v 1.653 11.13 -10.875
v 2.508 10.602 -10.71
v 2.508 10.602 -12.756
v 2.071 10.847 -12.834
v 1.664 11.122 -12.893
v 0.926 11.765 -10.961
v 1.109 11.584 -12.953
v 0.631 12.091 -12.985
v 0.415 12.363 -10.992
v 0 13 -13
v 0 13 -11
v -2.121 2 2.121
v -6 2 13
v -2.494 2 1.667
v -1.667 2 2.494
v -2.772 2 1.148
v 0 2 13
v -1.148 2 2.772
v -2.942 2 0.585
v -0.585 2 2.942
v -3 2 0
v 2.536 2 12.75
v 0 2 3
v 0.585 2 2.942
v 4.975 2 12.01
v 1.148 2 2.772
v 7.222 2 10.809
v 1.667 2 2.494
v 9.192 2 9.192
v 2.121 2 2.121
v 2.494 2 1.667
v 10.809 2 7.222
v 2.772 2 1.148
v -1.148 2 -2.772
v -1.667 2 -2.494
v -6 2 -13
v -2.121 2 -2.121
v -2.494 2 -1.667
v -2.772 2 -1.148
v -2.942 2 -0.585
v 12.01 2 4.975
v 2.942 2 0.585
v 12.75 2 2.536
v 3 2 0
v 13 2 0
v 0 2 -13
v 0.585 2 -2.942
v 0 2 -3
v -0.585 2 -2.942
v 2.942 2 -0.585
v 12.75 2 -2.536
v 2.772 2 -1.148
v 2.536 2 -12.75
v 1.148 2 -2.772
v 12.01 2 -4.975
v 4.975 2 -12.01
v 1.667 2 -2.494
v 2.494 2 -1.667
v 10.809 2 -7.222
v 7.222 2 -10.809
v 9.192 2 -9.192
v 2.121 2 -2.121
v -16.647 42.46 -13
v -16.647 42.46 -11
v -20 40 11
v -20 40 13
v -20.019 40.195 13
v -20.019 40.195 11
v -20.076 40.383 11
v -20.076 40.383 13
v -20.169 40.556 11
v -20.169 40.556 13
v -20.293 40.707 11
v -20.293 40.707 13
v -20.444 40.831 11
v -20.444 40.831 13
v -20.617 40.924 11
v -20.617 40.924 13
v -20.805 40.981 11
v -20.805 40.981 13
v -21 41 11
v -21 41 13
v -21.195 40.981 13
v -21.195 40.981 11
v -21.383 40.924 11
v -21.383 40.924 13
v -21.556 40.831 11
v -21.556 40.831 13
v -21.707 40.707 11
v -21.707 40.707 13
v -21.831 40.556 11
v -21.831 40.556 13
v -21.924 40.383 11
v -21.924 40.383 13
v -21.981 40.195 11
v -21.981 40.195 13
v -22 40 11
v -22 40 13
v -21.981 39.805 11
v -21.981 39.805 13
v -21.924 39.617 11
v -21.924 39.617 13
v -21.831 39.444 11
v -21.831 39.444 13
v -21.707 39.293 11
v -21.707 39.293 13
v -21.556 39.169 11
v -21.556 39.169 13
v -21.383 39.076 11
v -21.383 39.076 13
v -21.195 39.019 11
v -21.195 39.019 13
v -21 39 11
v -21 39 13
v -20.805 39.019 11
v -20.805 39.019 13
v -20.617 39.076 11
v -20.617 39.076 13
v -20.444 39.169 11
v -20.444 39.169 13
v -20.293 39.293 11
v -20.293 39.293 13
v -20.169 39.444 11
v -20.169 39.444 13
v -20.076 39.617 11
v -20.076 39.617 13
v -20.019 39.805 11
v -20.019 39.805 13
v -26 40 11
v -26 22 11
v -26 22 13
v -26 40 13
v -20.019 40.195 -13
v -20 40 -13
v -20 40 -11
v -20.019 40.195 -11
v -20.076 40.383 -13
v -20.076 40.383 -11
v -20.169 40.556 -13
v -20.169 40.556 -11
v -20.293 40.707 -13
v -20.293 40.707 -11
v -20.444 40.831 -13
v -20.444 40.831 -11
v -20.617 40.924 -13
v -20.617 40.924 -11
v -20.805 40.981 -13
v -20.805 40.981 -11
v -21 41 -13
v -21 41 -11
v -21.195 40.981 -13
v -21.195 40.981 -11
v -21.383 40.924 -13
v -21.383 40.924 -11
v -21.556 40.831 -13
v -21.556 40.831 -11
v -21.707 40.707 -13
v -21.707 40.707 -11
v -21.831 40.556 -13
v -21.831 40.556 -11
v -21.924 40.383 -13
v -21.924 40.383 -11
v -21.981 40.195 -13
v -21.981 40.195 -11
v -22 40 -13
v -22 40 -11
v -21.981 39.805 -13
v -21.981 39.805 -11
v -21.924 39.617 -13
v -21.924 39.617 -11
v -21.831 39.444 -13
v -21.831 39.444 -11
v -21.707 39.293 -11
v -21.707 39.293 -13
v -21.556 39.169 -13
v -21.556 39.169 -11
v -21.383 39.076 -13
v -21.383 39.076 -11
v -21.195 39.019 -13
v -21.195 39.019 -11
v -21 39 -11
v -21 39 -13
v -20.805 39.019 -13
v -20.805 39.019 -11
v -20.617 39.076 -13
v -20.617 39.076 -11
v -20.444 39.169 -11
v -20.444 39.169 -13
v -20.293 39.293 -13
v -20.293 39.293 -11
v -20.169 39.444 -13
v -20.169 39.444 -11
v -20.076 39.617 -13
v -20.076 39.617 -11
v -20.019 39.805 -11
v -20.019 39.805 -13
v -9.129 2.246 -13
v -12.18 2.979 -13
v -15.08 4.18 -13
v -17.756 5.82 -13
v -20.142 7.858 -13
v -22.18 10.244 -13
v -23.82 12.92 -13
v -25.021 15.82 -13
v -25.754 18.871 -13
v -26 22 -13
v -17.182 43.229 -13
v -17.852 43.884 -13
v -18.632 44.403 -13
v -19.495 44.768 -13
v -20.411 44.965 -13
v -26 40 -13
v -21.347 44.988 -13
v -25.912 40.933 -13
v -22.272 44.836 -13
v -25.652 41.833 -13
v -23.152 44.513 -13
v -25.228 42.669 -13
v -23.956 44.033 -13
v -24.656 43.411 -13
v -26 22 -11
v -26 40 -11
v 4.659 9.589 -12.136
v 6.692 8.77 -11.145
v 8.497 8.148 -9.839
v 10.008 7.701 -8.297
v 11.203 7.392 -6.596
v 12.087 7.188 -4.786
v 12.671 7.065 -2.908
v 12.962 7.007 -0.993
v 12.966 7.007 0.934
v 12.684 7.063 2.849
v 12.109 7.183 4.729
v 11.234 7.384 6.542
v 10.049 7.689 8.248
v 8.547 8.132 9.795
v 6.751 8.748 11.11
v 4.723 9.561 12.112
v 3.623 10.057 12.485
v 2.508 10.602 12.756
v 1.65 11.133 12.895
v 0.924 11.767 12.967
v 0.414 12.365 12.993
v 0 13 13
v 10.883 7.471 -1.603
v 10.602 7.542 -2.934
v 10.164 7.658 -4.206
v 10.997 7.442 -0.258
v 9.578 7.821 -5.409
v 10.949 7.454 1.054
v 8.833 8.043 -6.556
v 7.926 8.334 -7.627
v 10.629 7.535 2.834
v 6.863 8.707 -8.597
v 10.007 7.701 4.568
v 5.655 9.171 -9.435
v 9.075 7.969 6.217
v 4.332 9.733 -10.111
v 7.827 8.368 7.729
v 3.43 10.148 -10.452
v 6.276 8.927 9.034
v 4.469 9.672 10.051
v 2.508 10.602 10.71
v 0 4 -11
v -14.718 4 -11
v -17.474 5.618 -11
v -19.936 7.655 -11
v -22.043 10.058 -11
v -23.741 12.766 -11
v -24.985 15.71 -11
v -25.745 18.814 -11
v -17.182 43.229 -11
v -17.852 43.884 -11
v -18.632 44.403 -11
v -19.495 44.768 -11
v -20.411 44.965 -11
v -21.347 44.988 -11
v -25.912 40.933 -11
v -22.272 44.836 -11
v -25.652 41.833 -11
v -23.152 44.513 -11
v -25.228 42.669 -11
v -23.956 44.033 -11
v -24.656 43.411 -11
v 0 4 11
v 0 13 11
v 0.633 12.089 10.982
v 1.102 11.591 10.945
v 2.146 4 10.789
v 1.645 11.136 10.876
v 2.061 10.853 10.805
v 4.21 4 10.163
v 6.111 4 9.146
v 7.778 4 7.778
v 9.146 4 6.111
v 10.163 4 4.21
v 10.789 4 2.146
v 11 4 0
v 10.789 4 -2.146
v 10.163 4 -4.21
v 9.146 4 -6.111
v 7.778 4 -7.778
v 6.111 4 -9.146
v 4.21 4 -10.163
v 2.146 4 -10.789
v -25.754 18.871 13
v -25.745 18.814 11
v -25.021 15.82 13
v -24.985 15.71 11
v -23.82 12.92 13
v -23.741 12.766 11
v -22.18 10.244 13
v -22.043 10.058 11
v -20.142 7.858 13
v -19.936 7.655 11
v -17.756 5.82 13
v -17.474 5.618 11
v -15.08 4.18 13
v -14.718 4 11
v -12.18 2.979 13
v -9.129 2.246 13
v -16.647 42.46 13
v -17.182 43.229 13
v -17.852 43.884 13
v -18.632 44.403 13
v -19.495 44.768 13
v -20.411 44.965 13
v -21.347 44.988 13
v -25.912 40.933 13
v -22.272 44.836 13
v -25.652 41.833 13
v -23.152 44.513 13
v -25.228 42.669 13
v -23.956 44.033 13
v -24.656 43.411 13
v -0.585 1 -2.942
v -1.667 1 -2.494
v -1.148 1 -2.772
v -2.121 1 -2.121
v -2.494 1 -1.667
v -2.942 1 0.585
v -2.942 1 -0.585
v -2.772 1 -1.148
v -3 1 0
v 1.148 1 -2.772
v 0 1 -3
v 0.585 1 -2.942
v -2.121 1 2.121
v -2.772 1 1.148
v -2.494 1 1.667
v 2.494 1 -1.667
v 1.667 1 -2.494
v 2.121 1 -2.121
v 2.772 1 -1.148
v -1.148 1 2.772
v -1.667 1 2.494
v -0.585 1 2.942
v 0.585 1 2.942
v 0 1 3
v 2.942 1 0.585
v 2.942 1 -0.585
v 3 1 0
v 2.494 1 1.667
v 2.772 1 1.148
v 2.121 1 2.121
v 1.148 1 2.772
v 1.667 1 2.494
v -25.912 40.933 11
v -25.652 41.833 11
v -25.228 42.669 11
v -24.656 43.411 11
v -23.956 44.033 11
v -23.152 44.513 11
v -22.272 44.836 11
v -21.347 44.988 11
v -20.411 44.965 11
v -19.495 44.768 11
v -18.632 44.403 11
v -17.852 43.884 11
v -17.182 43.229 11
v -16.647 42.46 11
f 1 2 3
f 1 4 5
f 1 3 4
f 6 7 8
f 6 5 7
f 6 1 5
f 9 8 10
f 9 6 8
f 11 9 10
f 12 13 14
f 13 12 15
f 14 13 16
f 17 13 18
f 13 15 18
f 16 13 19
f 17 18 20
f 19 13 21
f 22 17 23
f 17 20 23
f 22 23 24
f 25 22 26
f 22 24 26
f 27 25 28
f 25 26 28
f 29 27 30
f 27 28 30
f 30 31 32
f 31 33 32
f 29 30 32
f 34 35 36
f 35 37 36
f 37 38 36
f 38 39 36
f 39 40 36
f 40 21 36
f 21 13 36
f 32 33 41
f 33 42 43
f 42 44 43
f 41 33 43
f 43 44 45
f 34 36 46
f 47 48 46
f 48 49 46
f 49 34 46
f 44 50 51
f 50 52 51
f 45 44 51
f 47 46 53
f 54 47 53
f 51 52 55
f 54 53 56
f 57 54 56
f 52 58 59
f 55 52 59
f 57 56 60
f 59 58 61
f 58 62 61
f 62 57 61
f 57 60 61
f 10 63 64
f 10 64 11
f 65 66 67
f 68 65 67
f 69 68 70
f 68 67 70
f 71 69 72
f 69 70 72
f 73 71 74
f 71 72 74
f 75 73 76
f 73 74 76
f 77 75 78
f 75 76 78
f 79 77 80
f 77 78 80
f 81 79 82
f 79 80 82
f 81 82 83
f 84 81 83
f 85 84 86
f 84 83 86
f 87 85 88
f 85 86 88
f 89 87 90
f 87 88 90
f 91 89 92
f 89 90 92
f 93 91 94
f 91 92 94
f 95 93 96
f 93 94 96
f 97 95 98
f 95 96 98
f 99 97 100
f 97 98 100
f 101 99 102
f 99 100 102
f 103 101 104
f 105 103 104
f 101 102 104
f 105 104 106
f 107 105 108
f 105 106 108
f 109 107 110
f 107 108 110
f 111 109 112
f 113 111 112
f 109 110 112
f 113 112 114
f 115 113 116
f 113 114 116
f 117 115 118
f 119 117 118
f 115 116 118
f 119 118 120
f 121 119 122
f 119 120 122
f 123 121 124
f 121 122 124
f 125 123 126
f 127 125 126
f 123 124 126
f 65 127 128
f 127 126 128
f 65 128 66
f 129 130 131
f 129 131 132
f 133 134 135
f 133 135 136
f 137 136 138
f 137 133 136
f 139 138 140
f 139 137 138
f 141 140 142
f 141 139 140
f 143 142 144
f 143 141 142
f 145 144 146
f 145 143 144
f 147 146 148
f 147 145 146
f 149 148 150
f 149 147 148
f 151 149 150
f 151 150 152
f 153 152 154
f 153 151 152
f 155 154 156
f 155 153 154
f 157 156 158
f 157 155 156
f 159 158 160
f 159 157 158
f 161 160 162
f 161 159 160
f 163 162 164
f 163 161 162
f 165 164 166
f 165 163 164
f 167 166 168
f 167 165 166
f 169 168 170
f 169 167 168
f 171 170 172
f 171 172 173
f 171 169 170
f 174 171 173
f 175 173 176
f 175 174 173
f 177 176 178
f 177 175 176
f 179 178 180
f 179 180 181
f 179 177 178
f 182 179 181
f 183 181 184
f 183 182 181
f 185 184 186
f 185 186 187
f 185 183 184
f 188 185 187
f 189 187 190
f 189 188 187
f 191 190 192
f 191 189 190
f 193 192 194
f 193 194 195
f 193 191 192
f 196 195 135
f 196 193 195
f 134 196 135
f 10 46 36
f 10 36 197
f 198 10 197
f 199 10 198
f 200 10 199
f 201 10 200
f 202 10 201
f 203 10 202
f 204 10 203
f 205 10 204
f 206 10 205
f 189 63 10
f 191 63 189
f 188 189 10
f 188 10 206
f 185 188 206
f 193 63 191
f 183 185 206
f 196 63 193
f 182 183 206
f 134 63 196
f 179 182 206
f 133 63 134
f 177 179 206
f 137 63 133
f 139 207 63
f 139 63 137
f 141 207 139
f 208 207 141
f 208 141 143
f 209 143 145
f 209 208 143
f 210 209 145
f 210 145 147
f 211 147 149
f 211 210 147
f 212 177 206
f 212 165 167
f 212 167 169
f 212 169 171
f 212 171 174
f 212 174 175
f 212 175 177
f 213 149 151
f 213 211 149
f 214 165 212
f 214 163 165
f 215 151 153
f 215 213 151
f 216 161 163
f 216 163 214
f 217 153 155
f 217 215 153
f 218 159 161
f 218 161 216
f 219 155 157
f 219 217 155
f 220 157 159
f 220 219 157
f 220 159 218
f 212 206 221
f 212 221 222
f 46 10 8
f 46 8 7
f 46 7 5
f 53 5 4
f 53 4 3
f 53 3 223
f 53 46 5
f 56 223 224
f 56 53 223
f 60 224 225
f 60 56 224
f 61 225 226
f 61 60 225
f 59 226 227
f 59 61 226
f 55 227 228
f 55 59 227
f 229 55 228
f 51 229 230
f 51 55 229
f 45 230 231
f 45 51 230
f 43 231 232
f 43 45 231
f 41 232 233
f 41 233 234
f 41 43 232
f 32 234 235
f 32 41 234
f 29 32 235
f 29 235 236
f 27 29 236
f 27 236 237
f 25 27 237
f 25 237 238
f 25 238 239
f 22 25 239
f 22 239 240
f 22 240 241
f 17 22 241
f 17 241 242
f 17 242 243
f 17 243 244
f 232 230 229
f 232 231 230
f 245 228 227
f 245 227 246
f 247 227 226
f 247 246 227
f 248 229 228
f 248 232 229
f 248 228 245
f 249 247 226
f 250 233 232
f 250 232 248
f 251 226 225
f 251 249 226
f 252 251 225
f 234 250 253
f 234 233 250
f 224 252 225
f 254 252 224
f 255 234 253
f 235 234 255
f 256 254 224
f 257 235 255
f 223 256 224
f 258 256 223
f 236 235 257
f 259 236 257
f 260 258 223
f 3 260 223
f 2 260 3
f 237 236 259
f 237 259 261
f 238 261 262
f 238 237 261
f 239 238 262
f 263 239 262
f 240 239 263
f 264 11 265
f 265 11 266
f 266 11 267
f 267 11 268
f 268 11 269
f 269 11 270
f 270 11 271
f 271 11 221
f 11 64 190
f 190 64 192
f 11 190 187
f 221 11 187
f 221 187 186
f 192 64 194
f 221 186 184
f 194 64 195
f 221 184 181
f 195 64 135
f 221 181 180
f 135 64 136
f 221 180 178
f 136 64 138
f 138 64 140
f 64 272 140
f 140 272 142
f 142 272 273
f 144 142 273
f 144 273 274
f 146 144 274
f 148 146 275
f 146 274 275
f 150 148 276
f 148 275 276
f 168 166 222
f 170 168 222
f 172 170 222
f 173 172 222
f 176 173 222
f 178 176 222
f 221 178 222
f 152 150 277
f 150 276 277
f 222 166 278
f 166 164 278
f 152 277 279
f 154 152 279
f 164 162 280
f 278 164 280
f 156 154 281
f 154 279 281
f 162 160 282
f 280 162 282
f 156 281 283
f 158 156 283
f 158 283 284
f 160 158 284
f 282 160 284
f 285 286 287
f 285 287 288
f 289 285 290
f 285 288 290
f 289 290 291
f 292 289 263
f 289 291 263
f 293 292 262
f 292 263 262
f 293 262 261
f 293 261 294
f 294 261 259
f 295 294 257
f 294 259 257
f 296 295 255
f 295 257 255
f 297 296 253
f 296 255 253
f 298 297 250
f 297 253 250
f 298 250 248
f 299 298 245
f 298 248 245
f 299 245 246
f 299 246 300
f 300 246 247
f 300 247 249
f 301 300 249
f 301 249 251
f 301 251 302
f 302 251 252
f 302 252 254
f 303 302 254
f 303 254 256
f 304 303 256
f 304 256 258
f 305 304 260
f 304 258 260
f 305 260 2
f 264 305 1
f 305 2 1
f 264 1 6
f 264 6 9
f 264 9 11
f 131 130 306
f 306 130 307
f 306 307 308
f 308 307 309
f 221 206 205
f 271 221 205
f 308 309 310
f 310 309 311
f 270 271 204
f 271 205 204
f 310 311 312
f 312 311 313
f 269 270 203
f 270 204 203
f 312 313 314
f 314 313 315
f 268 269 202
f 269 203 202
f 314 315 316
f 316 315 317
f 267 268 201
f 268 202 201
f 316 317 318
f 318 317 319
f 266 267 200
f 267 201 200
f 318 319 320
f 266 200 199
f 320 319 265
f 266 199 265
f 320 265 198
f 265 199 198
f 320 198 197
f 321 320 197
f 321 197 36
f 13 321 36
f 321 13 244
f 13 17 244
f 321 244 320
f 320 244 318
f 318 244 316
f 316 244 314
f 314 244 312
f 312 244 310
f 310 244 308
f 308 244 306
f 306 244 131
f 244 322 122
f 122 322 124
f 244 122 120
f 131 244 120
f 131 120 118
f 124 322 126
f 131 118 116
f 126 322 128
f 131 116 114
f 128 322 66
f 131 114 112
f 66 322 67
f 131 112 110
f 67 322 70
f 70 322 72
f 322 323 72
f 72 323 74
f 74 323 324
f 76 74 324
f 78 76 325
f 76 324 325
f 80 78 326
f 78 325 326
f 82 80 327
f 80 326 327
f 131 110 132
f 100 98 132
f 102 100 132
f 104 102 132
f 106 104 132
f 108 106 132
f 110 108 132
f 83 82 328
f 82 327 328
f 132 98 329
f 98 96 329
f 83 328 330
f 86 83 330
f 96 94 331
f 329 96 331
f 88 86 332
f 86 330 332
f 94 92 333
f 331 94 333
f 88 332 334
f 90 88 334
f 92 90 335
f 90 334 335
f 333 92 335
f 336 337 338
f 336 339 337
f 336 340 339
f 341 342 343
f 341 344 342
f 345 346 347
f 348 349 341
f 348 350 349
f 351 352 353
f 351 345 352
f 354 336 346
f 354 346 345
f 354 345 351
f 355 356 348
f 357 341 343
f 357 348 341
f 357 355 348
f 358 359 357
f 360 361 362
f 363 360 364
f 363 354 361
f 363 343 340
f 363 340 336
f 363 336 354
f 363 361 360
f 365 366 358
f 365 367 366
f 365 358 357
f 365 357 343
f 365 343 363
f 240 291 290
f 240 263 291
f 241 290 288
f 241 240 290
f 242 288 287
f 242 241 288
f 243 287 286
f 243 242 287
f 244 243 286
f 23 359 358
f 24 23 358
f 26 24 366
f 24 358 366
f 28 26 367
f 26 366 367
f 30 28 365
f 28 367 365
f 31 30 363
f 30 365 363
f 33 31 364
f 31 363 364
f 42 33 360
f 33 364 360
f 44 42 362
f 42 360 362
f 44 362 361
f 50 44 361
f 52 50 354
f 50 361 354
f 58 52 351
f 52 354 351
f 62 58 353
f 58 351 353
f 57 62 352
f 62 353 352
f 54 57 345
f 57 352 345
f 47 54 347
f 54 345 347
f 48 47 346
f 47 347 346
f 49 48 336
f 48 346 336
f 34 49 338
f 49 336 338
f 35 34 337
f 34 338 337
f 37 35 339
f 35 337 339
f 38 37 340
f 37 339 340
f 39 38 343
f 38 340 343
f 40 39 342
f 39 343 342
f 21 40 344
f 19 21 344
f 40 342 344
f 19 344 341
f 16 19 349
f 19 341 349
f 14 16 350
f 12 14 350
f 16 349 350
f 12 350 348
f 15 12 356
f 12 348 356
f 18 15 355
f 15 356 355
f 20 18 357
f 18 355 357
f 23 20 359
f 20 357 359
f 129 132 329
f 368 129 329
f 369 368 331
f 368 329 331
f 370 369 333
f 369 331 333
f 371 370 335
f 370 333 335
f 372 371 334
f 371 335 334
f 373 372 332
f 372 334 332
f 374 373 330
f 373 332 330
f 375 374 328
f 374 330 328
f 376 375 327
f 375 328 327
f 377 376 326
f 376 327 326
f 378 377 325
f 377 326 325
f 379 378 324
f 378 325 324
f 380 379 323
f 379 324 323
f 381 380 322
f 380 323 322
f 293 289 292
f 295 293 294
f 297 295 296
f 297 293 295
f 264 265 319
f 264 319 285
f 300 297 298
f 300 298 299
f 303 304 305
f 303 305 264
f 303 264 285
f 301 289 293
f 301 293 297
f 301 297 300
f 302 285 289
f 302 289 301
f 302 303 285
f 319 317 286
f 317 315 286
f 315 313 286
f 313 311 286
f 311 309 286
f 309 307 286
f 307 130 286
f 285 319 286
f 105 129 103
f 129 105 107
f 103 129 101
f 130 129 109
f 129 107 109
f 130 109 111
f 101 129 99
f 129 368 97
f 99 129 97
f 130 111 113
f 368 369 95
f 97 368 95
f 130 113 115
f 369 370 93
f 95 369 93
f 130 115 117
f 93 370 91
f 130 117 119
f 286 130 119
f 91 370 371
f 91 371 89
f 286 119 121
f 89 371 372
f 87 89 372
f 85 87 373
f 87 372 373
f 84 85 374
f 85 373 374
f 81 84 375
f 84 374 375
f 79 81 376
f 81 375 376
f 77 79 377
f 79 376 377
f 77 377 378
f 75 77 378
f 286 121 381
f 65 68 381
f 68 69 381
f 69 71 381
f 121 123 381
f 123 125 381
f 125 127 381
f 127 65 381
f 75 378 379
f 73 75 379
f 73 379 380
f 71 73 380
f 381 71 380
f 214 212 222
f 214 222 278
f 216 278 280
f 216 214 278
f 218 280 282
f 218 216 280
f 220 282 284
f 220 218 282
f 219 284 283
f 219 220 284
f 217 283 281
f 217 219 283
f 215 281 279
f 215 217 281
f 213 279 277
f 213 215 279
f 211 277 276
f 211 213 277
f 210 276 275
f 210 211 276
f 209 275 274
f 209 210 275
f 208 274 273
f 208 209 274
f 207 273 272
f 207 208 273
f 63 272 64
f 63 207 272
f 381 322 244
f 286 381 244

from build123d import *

# Parameters (mm, degrees)
SKETCH_1_R          = 2.15
EXTRUDE_1_DEPTH     = 1
EXTRUDE_2_DEPTH     = 12
SKETCH_8_R          = 1
EXTRUDE_4_DEPTH     = 2
CUT_EXTRUDE_1_DEPTH = 9
CUT_EXTRUDE_2_DEPTH = 20
SKETCH_12_R         = 3
CUT_EXTRUDE_3_DEPTH = 1
FILLET_1_R          = 20
SKETCH_13_W         = 60
SKETCH_13_H         = 50
CUT_EXTRUDE_4_DEPTH = 1


with BuildPart() as part:
    # 草图1 → 凸台-拉伸1 (new body)
    with BuildSketch(Plane(origin=(0, 0, 0), x_dir=(1, 0, 0), z_dir=(0, 1, 0))):
        with BuildLine():
            Line((-24, -22.5), (24, -22.5))
            ThreePointArc((24, -22.5), (26.828427125, -21.328427125), (28, -18.5))
            Line((28, -18.5), (28, 18.5))
            ThreePointArc((28, 18.5), (26.828427125, 21.328427125), (24, 22.5))
            Line((24, 22.5), (-24, 22.5))
            ThreePointArc((-24, 22.5), (-26.828427125, 21.328427125), (-28, 18.5))
            Line((-28, 18.5), (-28, -18.5))
            ThreePointArc((-28, -18.5), (-26.828427125, -21.328427125), (-24, -22.5))
        make_face()
        with Locations(Location((-23, 17.5, 0), (0, 0, 270))):
            Circle(SKETCH_1_R, mode=Mode.SUBTRACT)
        with Locations(Location((-23, -17.5, 0), (0, 0, 270))):
            Circle(SKETCH_1_R, mode=Mode.SUBTRACT)
        with Locations(Location((23, -17.5, 0), (0, 0, 270))):
            Circle(SKETCH_1_R, mode=Mode.SUBTRACT)
        with Locations(Location((23, 17.5, 0), (0, 0, 270))):
            Circle(SKETCH_1_R, mode=Mode.SUBTRACT)
    extrude(amount=EXTRUDE_1_DEPTH)

    # 草图3 → 凸台-拉伸2 (add)
    with BuildSketch(Plane(origin=(0, 1, 0), x_dir=(1, 0, 0), z_dir=(0, 1, 0))):
        with BuildLine():
            Line((-26, -13), (-26, 13))
            Line((-26, 13), (0, 13))
            ThreePointArc((0, 13), (13, 0), (0, -13))
            Line((0, -13), (-26, -13))
        make_face()
    extrude(amount=EXTRUDE_2_DEPTH)

    # 草图8 → 凸台-拉伸4 (add)
    with BuildSketch(Plane.XY.offset(13)):
        with BuildLine():
            Line((-26, 13), (-26, 40))
            ThreePointArc((-26, 40), (-22.271726092, 44.835567469), (-16.646914902, 42.459806928))
            Line((-16.646914902, 42.459806928), (0, 13))
            Line((0, 13), (-26, 13))
        make_face()
        with Locations((-21, 40)):
            Circle(SKETCH_8_R, mode=Mode.SUBTRACT)
    extrude_4 = extrude(amount=-EXTRUDE_4_DEPTH)

    # 镜向1: 凸台-拉伸4 across plane
    add(extrude_4.mirror(Plane.XY))

    # 草图9 → 切除-拉伸1 (cut)
    with BuildSketch(Plane(origin=(0, 13, 0), x_dir=(1, 0, 0), z_dir=(0, 1, 0))):
        with BuildLine():
            Line((-26, 11), (-26, -11))
            Line((-26, -11), (0, -11))
            ThreePointArc((0, -11), (11, 0), (0, 11))
            Line((0, 11), (-26, 11))
        make_face()
    extrude(amount=-CUT_EXTRUDE_1_DEPTH, mode=Mode.SUBTRACT)

    # 草图11 → 切除-拉伸2 (cut, symmetric)
    with BuildSketch(Plane.XY):
        with BuildLine():
            Line((0, 13), (13, 13))
            Line((13, 13), (13, 7))
            ThreePointArc((13, 7), (7.628297221, 8.43537945), (2.507532378, 10.601775609))
            ThreePointArc((2.507532378, 10.601775609), (1.076623467, 11.615671145), (0, 13))
        make_face()
    extrude(amount=CUT_EXTRUDE_2_DEPTH, both=True, mode=Mode.SUBTRACT)

    # 草图12 → 切除-拉伸3 (cut)
    with BuildSketch(Plane(origin=(0, 1, 0), x_dir=(1, 0, 0), z_dir=(0, 1, 0))):
        with BuildLine():
            Line((-26, -13), (0, -13))
            ThreePointArc((0, -13), (13, 0), (0, 13))
            Line((0, 13), (-26, 13))
            Line((-26, 13), (-26, -13))
        make_face()
        with Locations(Location((0, 0, 0), (0, 0, 270))):
            Circle(SKETCH_12_R, mode=Mode.SUBTRACT)
    extrude(amount=CUT_EXTRUDE_3_DEPTH, mode=Mode.SUBTRACT)

    # 圆角1
    # the kernel refuses this fillet: 20 mm, written as the material it takes off along each edge
    with BuildSketch(Plane(origin=(-26, 2, -63), x_dir=(1, 0, 0), z_dir=(0, 0, 1))) as fillet_1_piece_1:
        with BuildLine():
            CenterArc((FILLET_1_R, FILLET_1_R), FILLET_1_R, 180, 90)
            Line((0, FILLET_1_R), (0, 0))
            Line((0, 0), (FILLET_1_R, 0))
        make_face()
    extrude(amount=126, mode=Mode.SUBTRACT)

    # 草图13 → 切除-拉伸4 (cut)
    with BuildSketch(Plane.XZ):
        Rectangle(SKETCH_13_W, SKETCH_13_H)
    extrude(amount=-CUT_EXTRUDE_4_DEPTH, mode=Mode.SUBTRACT)


solid = part.part
